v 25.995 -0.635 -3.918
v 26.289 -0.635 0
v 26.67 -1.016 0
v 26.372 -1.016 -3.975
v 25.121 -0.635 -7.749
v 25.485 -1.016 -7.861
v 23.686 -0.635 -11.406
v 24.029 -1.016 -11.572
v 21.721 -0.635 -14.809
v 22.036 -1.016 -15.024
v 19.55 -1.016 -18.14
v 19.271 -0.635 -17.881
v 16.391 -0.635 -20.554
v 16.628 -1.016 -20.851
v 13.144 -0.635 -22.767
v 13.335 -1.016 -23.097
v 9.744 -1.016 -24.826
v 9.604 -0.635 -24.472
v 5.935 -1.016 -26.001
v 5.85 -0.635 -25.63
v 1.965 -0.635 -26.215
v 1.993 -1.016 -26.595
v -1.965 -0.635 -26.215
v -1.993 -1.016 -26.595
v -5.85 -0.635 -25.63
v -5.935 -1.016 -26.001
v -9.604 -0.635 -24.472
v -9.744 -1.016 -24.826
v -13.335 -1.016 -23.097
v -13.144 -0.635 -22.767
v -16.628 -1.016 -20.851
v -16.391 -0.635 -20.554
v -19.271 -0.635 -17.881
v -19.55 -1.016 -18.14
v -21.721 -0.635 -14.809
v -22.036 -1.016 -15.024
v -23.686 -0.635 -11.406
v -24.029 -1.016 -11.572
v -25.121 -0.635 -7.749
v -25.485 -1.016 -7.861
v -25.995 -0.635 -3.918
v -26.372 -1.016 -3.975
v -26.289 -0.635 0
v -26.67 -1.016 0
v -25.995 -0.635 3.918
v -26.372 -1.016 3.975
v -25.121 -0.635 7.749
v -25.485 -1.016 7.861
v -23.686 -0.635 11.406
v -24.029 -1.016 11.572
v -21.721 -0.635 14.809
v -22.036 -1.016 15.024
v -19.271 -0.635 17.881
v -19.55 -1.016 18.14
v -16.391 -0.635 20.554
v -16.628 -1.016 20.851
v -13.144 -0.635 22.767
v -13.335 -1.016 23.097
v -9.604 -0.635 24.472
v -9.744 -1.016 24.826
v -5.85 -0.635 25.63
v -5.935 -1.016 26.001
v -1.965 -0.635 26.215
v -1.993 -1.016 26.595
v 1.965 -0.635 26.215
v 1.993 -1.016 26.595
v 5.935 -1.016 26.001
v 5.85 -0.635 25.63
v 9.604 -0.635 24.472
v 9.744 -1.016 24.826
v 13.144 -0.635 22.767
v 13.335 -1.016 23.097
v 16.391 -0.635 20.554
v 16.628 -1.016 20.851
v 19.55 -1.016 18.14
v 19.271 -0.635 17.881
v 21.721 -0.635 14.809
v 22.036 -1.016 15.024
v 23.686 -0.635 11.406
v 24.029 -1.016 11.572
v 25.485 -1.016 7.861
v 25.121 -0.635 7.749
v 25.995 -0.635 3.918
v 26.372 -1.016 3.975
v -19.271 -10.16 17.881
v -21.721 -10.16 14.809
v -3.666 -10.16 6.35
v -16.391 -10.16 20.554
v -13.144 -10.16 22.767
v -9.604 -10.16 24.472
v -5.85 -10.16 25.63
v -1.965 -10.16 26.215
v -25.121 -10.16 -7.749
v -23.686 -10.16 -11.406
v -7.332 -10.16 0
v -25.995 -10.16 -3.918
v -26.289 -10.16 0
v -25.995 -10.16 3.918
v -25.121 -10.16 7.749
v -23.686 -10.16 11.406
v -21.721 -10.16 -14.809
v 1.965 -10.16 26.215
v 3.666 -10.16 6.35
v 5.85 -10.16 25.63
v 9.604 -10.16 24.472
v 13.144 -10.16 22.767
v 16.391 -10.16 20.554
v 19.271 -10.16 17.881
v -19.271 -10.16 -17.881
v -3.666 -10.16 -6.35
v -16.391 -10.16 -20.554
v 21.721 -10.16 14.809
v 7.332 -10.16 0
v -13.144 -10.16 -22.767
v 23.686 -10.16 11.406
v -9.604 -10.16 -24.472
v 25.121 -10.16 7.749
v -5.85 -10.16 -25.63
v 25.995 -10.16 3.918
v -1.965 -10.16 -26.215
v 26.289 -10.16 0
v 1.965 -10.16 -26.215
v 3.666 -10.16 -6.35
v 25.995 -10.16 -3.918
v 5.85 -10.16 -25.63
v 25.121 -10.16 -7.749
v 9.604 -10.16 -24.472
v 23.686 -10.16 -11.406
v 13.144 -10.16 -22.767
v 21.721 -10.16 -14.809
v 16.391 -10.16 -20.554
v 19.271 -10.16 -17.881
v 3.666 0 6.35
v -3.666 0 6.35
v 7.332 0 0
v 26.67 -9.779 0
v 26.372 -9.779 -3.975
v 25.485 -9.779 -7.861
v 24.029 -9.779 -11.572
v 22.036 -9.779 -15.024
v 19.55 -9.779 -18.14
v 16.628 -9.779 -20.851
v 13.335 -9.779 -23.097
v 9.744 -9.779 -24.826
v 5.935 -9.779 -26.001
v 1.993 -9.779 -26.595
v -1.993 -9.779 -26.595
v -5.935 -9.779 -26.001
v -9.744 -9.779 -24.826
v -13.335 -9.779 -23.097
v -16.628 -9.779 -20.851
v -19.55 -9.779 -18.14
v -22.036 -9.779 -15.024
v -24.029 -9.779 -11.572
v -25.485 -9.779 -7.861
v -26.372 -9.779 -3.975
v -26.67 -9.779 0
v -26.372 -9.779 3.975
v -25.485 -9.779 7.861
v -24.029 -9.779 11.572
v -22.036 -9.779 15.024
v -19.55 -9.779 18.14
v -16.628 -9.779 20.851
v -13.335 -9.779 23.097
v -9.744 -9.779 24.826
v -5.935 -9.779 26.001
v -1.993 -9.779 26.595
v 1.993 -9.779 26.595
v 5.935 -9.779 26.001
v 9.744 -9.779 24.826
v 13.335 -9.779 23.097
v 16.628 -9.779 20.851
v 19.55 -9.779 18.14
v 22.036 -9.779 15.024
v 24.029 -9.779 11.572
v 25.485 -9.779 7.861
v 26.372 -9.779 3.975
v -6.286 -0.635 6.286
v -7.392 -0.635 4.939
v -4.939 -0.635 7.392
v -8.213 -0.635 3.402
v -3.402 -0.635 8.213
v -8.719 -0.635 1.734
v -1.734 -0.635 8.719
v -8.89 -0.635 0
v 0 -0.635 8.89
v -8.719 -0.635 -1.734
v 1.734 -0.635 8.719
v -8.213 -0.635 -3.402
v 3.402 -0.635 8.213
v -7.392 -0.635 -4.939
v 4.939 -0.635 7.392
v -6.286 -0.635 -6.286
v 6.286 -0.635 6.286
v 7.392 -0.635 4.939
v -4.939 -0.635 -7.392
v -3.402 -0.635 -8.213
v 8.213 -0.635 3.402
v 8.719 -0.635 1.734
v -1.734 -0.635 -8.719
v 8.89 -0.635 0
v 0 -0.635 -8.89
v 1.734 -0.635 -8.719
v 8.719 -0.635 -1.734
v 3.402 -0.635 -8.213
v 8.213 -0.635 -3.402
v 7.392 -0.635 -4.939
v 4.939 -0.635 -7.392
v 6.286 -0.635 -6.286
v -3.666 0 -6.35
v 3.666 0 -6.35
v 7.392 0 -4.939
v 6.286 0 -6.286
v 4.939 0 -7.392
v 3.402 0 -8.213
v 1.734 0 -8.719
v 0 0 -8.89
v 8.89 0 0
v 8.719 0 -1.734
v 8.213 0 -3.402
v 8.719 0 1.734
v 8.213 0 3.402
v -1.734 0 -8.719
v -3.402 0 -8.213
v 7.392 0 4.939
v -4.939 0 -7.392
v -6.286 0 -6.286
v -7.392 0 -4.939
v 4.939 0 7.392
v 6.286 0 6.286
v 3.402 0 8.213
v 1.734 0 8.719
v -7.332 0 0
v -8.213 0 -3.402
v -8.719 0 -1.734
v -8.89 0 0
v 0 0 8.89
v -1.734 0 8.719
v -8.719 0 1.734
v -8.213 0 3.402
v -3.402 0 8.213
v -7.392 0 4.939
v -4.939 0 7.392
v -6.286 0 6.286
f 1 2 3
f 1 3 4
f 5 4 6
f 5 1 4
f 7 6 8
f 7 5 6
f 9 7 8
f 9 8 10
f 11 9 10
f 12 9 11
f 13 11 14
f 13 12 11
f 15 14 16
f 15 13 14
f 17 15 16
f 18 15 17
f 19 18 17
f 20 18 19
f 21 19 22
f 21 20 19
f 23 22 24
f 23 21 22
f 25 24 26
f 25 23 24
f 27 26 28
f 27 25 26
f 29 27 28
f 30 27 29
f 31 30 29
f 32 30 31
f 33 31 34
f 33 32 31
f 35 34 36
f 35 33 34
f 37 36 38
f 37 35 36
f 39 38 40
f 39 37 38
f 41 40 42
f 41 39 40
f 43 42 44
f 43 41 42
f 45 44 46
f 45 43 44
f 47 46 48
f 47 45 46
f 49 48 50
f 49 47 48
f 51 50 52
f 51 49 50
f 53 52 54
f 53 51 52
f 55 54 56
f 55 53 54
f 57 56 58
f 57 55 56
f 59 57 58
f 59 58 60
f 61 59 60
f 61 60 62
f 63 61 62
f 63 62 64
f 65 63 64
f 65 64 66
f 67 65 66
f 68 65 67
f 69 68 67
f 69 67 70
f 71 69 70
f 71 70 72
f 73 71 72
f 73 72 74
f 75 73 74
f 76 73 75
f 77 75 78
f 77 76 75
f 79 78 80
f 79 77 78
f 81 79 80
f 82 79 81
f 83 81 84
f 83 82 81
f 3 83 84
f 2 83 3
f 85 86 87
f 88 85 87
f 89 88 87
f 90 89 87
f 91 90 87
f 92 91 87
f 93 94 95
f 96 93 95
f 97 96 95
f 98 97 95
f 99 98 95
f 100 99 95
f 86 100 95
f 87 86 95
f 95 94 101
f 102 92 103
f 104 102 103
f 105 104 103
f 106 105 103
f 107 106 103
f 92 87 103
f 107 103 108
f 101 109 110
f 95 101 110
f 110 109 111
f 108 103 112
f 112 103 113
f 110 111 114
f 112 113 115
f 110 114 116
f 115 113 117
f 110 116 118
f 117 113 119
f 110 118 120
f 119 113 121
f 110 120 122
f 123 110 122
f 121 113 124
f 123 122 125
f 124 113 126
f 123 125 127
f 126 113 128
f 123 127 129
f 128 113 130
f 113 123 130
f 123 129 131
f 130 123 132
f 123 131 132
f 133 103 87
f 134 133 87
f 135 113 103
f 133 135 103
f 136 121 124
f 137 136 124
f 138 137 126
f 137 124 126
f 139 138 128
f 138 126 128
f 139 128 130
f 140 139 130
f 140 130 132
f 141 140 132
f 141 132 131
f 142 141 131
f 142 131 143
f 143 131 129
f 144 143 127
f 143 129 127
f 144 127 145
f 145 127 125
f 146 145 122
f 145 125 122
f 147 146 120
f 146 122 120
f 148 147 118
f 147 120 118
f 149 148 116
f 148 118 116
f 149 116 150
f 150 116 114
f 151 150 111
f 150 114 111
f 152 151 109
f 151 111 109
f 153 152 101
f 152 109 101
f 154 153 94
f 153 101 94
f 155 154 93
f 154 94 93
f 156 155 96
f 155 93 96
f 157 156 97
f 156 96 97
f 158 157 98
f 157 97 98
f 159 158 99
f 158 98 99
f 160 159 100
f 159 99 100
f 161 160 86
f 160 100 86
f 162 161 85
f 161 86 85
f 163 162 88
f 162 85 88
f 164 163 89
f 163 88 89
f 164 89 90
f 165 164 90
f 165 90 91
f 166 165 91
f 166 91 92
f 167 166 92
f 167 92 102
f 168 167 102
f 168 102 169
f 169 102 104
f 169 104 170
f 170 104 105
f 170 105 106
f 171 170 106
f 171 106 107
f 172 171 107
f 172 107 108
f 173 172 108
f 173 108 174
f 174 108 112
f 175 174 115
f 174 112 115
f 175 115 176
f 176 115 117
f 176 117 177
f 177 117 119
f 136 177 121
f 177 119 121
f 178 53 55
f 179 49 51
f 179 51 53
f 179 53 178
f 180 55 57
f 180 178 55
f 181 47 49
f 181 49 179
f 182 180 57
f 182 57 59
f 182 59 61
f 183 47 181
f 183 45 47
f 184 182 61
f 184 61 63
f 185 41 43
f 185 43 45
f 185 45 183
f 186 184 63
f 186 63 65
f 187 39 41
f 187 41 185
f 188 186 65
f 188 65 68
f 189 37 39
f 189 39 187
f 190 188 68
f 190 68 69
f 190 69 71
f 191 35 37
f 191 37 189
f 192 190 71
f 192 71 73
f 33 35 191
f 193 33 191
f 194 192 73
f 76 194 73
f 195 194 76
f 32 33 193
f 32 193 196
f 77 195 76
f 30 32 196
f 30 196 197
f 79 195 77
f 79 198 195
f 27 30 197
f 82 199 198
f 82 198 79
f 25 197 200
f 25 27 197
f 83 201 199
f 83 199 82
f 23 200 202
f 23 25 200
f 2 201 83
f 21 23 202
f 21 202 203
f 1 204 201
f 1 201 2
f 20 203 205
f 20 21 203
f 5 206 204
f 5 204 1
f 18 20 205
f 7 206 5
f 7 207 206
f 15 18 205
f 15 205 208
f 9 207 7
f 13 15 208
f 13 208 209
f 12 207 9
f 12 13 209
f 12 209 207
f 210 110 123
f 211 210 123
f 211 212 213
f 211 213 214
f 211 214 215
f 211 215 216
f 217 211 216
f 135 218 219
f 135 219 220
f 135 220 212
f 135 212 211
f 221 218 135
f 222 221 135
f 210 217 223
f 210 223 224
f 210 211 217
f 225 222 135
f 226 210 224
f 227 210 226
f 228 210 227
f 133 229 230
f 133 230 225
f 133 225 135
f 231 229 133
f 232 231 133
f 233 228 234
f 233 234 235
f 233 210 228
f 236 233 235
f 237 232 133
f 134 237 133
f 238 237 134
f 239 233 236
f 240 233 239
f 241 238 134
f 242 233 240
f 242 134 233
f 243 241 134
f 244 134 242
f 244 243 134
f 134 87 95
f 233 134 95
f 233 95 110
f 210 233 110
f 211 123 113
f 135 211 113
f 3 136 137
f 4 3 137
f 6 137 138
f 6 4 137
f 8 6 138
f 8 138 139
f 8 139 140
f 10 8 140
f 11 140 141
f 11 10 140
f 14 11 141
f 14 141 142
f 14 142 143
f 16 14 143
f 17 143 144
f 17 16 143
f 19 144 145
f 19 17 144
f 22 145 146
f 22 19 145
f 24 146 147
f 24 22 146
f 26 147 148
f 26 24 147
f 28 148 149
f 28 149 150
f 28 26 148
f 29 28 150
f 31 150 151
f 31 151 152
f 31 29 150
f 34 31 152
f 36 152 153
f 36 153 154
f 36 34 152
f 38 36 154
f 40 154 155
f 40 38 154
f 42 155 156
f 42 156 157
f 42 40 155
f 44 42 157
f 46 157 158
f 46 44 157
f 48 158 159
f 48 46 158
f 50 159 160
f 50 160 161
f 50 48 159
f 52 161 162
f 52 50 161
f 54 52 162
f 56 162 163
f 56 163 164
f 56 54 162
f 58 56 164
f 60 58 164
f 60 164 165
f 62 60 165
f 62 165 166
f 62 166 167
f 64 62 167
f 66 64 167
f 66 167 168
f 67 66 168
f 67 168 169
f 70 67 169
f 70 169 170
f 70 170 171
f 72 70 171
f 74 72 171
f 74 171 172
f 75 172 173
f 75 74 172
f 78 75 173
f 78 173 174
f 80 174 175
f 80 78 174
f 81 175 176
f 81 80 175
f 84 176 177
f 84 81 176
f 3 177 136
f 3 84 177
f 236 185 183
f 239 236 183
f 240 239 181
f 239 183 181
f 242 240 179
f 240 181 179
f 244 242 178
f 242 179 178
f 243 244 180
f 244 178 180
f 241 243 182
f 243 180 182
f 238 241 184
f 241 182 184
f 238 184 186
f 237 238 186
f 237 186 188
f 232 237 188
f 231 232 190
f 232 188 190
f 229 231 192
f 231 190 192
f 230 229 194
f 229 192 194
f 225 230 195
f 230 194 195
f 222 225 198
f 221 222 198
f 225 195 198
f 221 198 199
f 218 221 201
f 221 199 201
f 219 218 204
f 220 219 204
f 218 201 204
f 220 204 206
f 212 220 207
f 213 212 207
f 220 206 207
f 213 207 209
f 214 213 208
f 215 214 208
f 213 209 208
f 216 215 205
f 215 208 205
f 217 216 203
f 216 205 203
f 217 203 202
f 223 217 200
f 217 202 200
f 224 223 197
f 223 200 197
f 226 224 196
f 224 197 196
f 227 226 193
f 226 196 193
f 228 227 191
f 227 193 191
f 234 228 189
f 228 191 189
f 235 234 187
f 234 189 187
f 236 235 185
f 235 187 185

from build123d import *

# Parameters (mm, degrees)
SKETCH1_W           = 26.67
SKETCH1_H           = 9.525
SKETCH2_R           = 8.89
BOSS_EXTRUDE1_DEPTH = 0.635
CUT_EXTRUDE1_DEPTH  = 11.16
CHAMFER1_SIZE       = 0.381


with BuildPart() as part:
    # Sketch1 → Revolve1 (revolve)
    with BuildSketch(Plane(origin=(0, 0, 0), x_dir=(-1, 0, 0), z_dir=(0, 0, -1))):
        with Locations((-13.335, -5.3975)):
            Rectangle(SKETCH1_W, SKETCH1_H)
    revolve(axis=Axis((0, -10.16, 0), (0, 1, 0)))

    # Sketch2 → Boss-Extrude1 (add)
    with BuildSketch(Plane(origin=(0, -0.635, 0), x_dir=(-1, 0, 0), z_dir=(0, 1, 0))):
        Circle(SKETCH2_R)
    extrude(amount=BOSS_EXTRUDE1_DEPTH)

    # Sketch3 → Cut-Extrude1 (cut, through all)
    with BuildSketch(Plane.XZ.offset(10.16)):
        Polygon((-7.332348419, 0), (-3.666174209, -6.35), (3.666174209, -6.35), (7.332348419, 0), (3.666174209, 6.35), (-3.666174209, 6.35), align=None)
    extrude(amount=-CUT_EXTRUDE1_DEPTH, mode=Mode.SUBTRACT)

    # Chamfer1
    chamfer1_edges = [part.edges().sort_by_distance(p)[0] for p in [
        (-26.67, -0.635, 0),
        (-26.67, -10.16, 0),
    ]]
    chamfer(chamfer1_edges, length=CHAMFER1_SIZE)


solid = part.part
